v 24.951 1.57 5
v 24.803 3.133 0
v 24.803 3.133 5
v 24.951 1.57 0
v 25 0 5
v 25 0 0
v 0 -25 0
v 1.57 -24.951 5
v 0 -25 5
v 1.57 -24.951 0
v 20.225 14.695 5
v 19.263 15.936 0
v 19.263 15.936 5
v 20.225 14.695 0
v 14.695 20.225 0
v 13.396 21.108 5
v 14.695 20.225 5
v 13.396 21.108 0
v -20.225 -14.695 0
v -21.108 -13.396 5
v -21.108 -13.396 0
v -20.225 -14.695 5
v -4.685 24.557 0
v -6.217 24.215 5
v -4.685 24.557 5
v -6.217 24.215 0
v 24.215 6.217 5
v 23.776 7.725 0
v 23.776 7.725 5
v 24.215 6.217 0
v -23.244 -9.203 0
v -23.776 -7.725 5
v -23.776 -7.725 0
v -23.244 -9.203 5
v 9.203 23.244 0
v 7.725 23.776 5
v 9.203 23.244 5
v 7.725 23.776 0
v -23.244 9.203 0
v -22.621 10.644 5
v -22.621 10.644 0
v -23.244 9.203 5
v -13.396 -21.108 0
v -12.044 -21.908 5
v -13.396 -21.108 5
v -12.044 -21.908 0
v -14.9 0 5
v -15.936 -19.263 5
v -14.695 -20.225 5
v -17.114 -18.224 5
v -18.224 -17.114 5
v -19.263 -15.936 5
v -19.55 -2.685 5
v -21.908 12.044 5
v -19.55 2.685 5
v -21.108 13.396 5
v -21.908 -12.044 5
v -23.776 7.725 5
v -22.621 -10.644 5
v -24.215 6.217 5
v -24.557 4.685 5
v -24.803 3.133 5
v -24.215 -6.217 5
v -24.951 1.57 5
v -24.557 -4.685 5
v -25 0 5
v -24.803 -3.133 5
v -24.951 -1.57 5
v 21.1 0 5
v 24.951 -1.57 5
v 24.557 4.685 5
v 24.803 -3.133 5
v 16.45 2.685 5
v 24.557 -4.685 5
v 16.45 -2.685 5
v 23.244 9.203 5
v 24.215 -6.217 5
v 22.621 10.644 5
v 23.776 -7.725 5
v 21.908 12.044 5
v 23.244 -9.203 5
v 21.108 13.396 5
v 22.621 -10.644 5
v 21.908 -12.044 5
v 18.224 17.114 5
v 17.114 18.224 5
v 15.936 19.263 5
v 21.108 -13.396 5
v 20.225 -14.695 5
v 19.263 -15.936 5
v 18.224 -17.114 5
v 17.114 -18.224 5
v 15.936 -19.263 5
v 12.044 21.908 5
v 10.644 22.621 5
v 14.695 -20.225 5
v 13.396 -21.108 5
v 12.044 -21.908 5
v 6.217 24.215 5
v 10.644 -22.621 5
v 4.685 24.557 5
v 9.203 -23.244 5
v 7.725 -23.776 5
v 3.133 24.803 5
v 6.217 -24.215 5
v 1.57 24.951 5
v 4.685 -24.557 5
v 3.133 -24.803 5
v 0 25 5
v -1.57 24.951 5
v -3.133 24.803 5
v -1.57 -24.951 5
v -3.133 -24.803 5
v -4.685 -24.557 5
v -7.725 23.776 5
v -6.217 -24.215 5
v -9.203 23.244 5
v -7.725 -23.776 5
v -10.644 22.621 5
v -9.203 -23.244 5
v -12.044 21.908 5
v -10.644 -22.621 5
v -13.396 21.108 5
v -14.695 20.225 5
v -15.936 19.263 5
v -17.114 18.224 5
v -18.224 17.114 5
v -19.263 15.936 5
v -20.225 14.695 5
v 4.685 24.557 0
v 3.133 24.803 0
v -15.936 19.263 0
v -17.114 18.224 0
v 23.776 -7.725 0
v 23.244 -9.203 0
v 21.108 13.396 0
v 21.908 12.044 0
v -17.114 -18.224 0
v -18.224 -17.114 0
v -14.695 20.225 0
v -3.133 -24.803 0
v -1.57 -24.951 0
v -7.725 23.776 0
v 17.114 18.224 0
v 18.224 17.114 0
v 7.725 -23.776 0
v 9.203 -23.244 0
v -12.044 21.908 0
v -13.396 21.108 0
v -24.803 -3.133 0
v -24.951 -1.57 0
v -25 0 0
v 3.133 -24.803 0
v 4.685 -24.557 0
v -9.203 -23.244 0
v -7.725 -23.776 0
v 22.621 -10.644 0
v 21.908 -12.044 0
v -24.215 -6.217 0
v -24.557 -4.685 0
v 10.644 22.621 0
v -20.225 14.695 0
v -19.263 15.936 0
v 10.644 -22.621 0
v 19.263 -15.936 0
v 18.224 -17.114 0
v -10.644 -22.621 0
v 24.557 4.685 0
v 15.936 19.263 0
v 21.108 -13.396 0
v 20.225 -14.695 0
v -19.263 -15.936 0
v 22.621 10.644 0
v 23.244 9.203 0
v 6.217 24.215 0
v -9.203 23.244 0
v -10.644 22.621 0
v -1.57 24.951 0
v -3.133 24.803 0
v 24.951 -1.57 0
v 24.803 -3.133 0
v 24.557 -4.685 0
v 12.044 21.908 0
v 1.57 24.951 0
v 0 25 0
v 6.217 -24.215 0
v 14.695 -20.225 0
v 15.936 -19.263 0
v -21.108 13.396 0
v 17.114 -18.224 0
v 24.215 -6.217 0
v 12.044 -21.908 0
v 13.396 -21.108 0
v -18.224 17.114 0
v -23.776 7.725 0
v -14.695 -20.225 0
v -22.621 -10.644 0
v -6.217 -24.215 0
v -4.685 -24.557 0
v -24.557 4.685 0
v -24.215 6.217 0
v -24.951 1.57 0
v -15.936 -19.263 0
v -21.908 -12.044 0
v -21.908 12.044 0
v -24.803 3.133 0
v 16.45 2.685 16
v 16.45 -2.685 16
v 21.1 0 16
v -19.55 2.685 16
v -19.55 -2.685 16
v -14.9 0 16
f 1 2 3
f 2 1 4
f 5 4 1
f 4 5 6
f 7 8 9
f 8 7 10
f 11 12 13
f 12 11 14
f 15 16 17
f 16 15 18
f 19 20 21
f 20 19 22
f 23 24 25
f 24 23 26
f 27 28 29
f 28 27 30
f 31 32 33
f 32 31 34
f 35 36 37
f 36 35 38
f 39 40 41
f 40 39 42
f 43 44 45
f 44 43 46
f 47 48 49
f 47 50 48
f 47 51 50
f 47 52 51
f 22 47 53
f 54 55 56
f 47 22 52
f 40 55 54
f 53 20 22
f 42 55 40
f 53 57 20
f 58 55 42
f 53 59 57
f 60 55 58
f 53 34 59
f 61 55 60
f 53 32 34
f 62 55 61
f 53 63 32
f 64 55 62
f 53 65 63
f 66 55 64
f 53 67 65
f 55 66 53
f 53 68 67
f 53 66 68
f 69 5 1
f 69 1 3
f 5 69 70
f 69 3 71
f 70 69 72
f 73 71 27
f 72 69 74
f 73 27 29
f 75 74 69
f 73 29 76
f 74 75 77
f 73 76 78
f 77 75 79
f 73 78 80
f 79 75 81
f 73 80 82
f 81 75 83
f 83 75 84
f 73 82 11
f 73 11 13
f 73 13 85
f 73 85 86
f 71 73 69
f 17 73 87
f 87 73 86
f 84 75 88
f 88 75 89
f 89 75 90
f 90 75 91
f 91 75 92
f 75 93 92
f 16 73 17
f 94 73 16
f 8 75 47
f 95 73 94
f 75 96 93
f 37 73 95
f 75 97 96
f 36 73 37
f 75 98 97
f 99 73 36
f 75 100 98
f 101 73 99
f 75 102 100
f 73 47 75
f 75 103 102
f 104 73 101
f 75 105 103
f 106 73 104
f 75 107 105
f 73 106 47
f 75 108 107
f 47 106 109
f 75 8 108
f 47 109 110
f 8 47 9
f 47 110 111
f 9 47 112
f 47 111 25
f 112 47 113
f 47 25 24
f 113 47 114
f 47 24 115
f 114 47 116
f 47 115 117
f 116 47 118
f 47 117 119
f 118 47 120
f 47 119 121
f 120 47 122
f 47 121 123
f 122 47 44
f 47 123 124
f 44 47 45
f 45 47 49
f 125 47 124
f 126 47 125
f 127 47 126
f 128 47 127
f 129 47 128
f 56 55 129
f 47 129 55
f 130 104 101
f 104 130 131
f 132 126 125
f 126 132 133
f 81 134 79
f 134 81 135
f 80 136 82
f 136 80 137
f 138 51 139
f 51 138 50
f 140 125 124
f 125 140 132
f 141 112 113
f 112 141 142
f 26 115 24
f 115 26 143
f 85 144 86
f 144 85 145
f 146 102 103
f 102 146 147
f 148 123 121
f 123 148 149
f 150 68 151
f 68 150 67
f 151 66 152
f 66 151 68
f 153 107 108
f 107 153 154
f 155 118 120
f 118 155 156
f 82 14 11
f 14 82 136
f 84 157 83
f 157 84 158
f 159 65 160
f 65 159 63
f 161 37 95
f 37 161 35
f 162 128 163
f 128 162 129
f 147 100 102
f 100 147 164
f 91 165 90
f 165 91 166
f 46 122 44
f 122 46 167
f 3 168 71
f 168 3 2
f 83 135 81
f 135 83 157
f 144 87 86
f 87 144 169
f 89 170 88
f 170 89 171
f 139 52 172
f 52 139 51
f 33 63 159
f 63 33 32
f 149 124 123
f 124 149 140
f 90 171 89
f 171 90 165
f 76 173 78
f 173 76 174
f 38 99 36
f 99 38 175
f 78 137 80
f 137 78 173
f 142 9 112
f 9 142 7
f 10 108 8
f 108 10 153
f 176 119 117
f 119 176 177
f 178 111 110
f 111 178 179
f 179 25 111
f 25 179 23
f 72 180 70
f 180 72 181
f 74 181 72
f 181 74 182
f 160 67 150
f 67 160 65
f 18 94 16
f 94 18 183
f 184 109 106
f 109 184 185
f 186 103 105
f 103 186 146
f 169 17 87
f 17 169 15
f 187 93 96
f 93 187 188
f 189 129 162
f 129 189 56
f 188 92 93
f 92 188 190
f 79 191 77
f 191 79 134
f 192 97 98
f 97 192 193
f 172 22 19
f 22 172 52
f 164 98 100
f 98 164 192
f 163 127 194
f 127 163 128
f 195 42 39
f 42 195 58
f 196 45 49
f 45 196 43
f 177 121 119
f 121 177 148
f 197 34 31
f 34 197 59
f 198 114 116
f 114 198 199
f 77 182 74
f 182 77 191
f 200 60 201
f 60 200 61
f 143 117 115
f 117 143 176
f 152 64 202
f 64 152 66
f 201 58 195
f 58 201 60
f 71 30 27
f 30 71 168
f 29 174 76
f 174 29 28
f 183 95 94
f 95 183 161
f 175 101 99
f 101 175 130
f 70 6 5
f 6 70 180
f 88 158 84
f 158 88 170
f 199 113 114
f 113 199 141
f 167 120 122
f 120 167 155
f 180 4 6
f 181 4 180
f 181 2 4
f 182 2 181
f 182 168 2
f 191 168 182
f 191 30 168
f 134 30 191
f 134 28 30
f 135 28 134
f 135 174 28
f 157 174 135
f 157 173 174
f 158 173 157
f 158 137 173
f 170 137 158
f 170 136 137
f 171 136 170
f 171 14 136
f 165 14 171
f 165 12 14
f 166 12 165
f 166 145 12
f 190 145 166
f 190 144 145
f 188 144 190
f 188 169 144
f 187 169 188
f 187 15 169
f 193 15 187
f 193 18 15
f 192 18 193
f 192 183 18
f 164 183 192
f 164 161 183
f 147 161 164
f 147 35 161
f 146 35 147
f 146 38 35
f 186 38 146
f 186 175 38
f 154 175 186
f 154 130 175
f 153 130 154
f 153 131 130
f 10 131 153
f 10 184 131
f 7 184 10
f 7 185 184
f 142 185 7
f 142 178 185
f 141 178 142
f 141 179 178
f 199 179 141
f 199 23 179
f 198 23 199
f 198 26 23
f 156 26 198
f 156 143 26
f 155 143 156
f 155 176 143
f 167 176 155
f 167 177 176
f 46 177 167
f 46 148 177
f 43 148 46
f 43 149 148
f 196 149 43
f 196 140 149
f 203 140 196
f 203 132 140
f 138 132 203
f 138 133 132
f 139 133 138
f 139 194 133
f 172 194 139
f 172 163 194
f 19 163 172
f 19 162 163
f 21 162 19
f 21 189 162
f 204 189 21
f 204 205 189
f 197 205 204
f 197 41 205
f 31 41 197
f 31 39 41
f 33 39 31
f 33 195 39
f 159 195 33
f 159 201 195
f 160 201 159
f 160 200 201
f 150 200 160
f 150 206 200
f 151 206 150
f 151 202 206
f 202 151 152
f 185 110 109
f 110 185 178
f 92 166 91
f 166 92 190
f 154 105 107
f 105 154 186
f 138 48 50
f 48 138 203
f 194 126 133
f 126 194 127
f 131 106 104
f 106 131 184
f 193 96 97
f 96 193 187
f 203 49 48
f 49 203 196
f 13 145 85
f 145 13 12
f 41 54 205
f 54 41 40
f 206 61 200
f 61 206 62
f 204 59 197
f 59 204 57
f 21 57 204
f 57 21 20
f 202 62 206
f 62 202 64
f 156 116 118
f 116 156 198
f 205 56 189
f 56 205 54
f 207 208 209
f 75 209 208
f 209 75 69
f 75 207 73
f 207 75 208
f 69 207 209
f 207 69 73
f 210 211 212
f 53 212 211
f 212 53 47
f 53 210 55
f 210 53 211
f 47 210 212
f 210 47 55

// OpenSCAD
diametro_cilindo = 25;
diametro_cilindo_interior = 10;
altura = 5;
pathRadius=36/2;
num=8;

radio_pajita = 5.4/2;
radio_pajita_medio = 4.9/2;
radio_pajita_grosor = 1.5;
cono_altura = 18;

difference() {
  cilindro_base(diametro_cilindo, diametro_cilindo_interior, altura);
  separacion_cilindro(pathRadius, num, altura);
}
conos();

module conos() {
  translate([18, 0, 16]) {
    rotate([0, 90, 0]) {
      colores = "red";
      color(colores){
        triangulo_base();
      }
    }
    //#cilindro();
  }
  translate([-18, 0, 16]) {
    rotate([0, 90, 0]) {
      colores = "red";
      color(colores){
        triangulo_base();
      }
    }
    /*#cilindro();*/
  }
}


module separacion_cilindro(distancia, numero, alt) {

  for (i=[1:numero])  {
    translate([distancia*cos(i*(360/numero)),distancia*sin(i*(360/numero)),0])
    if (i == 4){
      colores = "red";
      color(colores){
        //cylinder(r=4,h=alt, $fn=100);
        /*ranura_cilindro([distancia*cos(i*(360/numero)),distancia*sin(i*(360/numero)),0]);*/
      }
    } else if(i == 8) {
      colores = "blue";
      color(colores){
        //cylinder(r=4,h=alt, $fn=100);
        /*ranura_cilindro([distancia*cos(i*(360/numero)),distancia*sin(i*(360/numero)),0]);*/
      }
    } else {
      colores = "green";
      color(colores){
        //cylinder(r=5,h=alt, $fn=100);
      }
    }
  }
}

module cilindro_base(diamentro, interior, altura) {
  difference() {
    cylinder(r=diamentro, h=altura, $fn=100);
    //cylinder(r=diametro_cilindo_interior, h=altura, $fn=100);
  }
}

module cilindro() {
  difference() {
		/*cylinder(r=radio_pajita*radio_pajita_grosor, h=altura, $fn=100);*/
		cono(radio_pajita, radio_pajita_medio, cono_altura);
  }
}

module cono(base, medio, altura_cono) {
	translate([0, 0, altura_cono/2]) {
  	cylinder(r=medio, r2=base, h=altura_cono/2, $fn=100);
	}
  cylinder(r=base, r2=medio, h=altura_cono/2, $fn=100);
}

module triangulo_base(){
  rotate([0, 90, 0]) {
    rotate(-30){
      triangle_tube(16, 6.2/2, 6.2/2);
    }
  }
}



//triangle_tube(20, 5, 5);
module triangle_tube(height,radius,wall)
{
   tubify(radius,wall) triangle_prism(height,radius);
}

//Tubifies any regular prism
module tubify(radius,wall)
{
  difference()
  {
    child(0);
    translate([0, 0, -0.1]) scale([(radius-wall)/radius, (radius-wall)/radius, 2]) child(0);
  }
}

module triangle_prism(height,radius)
{
  linear_extrude(height=height) triangle(radius);
}

module triangle(radius)
{
  o=radius/2;		//equivalent to radius*sin(30)
  a=radius*sqrt(3)/2;	//equivalent to radius*cos(30)
  polygon(points=[[-a,-o],[0,radius],[a,-o]],paths=[[0,1,2]]);
}
